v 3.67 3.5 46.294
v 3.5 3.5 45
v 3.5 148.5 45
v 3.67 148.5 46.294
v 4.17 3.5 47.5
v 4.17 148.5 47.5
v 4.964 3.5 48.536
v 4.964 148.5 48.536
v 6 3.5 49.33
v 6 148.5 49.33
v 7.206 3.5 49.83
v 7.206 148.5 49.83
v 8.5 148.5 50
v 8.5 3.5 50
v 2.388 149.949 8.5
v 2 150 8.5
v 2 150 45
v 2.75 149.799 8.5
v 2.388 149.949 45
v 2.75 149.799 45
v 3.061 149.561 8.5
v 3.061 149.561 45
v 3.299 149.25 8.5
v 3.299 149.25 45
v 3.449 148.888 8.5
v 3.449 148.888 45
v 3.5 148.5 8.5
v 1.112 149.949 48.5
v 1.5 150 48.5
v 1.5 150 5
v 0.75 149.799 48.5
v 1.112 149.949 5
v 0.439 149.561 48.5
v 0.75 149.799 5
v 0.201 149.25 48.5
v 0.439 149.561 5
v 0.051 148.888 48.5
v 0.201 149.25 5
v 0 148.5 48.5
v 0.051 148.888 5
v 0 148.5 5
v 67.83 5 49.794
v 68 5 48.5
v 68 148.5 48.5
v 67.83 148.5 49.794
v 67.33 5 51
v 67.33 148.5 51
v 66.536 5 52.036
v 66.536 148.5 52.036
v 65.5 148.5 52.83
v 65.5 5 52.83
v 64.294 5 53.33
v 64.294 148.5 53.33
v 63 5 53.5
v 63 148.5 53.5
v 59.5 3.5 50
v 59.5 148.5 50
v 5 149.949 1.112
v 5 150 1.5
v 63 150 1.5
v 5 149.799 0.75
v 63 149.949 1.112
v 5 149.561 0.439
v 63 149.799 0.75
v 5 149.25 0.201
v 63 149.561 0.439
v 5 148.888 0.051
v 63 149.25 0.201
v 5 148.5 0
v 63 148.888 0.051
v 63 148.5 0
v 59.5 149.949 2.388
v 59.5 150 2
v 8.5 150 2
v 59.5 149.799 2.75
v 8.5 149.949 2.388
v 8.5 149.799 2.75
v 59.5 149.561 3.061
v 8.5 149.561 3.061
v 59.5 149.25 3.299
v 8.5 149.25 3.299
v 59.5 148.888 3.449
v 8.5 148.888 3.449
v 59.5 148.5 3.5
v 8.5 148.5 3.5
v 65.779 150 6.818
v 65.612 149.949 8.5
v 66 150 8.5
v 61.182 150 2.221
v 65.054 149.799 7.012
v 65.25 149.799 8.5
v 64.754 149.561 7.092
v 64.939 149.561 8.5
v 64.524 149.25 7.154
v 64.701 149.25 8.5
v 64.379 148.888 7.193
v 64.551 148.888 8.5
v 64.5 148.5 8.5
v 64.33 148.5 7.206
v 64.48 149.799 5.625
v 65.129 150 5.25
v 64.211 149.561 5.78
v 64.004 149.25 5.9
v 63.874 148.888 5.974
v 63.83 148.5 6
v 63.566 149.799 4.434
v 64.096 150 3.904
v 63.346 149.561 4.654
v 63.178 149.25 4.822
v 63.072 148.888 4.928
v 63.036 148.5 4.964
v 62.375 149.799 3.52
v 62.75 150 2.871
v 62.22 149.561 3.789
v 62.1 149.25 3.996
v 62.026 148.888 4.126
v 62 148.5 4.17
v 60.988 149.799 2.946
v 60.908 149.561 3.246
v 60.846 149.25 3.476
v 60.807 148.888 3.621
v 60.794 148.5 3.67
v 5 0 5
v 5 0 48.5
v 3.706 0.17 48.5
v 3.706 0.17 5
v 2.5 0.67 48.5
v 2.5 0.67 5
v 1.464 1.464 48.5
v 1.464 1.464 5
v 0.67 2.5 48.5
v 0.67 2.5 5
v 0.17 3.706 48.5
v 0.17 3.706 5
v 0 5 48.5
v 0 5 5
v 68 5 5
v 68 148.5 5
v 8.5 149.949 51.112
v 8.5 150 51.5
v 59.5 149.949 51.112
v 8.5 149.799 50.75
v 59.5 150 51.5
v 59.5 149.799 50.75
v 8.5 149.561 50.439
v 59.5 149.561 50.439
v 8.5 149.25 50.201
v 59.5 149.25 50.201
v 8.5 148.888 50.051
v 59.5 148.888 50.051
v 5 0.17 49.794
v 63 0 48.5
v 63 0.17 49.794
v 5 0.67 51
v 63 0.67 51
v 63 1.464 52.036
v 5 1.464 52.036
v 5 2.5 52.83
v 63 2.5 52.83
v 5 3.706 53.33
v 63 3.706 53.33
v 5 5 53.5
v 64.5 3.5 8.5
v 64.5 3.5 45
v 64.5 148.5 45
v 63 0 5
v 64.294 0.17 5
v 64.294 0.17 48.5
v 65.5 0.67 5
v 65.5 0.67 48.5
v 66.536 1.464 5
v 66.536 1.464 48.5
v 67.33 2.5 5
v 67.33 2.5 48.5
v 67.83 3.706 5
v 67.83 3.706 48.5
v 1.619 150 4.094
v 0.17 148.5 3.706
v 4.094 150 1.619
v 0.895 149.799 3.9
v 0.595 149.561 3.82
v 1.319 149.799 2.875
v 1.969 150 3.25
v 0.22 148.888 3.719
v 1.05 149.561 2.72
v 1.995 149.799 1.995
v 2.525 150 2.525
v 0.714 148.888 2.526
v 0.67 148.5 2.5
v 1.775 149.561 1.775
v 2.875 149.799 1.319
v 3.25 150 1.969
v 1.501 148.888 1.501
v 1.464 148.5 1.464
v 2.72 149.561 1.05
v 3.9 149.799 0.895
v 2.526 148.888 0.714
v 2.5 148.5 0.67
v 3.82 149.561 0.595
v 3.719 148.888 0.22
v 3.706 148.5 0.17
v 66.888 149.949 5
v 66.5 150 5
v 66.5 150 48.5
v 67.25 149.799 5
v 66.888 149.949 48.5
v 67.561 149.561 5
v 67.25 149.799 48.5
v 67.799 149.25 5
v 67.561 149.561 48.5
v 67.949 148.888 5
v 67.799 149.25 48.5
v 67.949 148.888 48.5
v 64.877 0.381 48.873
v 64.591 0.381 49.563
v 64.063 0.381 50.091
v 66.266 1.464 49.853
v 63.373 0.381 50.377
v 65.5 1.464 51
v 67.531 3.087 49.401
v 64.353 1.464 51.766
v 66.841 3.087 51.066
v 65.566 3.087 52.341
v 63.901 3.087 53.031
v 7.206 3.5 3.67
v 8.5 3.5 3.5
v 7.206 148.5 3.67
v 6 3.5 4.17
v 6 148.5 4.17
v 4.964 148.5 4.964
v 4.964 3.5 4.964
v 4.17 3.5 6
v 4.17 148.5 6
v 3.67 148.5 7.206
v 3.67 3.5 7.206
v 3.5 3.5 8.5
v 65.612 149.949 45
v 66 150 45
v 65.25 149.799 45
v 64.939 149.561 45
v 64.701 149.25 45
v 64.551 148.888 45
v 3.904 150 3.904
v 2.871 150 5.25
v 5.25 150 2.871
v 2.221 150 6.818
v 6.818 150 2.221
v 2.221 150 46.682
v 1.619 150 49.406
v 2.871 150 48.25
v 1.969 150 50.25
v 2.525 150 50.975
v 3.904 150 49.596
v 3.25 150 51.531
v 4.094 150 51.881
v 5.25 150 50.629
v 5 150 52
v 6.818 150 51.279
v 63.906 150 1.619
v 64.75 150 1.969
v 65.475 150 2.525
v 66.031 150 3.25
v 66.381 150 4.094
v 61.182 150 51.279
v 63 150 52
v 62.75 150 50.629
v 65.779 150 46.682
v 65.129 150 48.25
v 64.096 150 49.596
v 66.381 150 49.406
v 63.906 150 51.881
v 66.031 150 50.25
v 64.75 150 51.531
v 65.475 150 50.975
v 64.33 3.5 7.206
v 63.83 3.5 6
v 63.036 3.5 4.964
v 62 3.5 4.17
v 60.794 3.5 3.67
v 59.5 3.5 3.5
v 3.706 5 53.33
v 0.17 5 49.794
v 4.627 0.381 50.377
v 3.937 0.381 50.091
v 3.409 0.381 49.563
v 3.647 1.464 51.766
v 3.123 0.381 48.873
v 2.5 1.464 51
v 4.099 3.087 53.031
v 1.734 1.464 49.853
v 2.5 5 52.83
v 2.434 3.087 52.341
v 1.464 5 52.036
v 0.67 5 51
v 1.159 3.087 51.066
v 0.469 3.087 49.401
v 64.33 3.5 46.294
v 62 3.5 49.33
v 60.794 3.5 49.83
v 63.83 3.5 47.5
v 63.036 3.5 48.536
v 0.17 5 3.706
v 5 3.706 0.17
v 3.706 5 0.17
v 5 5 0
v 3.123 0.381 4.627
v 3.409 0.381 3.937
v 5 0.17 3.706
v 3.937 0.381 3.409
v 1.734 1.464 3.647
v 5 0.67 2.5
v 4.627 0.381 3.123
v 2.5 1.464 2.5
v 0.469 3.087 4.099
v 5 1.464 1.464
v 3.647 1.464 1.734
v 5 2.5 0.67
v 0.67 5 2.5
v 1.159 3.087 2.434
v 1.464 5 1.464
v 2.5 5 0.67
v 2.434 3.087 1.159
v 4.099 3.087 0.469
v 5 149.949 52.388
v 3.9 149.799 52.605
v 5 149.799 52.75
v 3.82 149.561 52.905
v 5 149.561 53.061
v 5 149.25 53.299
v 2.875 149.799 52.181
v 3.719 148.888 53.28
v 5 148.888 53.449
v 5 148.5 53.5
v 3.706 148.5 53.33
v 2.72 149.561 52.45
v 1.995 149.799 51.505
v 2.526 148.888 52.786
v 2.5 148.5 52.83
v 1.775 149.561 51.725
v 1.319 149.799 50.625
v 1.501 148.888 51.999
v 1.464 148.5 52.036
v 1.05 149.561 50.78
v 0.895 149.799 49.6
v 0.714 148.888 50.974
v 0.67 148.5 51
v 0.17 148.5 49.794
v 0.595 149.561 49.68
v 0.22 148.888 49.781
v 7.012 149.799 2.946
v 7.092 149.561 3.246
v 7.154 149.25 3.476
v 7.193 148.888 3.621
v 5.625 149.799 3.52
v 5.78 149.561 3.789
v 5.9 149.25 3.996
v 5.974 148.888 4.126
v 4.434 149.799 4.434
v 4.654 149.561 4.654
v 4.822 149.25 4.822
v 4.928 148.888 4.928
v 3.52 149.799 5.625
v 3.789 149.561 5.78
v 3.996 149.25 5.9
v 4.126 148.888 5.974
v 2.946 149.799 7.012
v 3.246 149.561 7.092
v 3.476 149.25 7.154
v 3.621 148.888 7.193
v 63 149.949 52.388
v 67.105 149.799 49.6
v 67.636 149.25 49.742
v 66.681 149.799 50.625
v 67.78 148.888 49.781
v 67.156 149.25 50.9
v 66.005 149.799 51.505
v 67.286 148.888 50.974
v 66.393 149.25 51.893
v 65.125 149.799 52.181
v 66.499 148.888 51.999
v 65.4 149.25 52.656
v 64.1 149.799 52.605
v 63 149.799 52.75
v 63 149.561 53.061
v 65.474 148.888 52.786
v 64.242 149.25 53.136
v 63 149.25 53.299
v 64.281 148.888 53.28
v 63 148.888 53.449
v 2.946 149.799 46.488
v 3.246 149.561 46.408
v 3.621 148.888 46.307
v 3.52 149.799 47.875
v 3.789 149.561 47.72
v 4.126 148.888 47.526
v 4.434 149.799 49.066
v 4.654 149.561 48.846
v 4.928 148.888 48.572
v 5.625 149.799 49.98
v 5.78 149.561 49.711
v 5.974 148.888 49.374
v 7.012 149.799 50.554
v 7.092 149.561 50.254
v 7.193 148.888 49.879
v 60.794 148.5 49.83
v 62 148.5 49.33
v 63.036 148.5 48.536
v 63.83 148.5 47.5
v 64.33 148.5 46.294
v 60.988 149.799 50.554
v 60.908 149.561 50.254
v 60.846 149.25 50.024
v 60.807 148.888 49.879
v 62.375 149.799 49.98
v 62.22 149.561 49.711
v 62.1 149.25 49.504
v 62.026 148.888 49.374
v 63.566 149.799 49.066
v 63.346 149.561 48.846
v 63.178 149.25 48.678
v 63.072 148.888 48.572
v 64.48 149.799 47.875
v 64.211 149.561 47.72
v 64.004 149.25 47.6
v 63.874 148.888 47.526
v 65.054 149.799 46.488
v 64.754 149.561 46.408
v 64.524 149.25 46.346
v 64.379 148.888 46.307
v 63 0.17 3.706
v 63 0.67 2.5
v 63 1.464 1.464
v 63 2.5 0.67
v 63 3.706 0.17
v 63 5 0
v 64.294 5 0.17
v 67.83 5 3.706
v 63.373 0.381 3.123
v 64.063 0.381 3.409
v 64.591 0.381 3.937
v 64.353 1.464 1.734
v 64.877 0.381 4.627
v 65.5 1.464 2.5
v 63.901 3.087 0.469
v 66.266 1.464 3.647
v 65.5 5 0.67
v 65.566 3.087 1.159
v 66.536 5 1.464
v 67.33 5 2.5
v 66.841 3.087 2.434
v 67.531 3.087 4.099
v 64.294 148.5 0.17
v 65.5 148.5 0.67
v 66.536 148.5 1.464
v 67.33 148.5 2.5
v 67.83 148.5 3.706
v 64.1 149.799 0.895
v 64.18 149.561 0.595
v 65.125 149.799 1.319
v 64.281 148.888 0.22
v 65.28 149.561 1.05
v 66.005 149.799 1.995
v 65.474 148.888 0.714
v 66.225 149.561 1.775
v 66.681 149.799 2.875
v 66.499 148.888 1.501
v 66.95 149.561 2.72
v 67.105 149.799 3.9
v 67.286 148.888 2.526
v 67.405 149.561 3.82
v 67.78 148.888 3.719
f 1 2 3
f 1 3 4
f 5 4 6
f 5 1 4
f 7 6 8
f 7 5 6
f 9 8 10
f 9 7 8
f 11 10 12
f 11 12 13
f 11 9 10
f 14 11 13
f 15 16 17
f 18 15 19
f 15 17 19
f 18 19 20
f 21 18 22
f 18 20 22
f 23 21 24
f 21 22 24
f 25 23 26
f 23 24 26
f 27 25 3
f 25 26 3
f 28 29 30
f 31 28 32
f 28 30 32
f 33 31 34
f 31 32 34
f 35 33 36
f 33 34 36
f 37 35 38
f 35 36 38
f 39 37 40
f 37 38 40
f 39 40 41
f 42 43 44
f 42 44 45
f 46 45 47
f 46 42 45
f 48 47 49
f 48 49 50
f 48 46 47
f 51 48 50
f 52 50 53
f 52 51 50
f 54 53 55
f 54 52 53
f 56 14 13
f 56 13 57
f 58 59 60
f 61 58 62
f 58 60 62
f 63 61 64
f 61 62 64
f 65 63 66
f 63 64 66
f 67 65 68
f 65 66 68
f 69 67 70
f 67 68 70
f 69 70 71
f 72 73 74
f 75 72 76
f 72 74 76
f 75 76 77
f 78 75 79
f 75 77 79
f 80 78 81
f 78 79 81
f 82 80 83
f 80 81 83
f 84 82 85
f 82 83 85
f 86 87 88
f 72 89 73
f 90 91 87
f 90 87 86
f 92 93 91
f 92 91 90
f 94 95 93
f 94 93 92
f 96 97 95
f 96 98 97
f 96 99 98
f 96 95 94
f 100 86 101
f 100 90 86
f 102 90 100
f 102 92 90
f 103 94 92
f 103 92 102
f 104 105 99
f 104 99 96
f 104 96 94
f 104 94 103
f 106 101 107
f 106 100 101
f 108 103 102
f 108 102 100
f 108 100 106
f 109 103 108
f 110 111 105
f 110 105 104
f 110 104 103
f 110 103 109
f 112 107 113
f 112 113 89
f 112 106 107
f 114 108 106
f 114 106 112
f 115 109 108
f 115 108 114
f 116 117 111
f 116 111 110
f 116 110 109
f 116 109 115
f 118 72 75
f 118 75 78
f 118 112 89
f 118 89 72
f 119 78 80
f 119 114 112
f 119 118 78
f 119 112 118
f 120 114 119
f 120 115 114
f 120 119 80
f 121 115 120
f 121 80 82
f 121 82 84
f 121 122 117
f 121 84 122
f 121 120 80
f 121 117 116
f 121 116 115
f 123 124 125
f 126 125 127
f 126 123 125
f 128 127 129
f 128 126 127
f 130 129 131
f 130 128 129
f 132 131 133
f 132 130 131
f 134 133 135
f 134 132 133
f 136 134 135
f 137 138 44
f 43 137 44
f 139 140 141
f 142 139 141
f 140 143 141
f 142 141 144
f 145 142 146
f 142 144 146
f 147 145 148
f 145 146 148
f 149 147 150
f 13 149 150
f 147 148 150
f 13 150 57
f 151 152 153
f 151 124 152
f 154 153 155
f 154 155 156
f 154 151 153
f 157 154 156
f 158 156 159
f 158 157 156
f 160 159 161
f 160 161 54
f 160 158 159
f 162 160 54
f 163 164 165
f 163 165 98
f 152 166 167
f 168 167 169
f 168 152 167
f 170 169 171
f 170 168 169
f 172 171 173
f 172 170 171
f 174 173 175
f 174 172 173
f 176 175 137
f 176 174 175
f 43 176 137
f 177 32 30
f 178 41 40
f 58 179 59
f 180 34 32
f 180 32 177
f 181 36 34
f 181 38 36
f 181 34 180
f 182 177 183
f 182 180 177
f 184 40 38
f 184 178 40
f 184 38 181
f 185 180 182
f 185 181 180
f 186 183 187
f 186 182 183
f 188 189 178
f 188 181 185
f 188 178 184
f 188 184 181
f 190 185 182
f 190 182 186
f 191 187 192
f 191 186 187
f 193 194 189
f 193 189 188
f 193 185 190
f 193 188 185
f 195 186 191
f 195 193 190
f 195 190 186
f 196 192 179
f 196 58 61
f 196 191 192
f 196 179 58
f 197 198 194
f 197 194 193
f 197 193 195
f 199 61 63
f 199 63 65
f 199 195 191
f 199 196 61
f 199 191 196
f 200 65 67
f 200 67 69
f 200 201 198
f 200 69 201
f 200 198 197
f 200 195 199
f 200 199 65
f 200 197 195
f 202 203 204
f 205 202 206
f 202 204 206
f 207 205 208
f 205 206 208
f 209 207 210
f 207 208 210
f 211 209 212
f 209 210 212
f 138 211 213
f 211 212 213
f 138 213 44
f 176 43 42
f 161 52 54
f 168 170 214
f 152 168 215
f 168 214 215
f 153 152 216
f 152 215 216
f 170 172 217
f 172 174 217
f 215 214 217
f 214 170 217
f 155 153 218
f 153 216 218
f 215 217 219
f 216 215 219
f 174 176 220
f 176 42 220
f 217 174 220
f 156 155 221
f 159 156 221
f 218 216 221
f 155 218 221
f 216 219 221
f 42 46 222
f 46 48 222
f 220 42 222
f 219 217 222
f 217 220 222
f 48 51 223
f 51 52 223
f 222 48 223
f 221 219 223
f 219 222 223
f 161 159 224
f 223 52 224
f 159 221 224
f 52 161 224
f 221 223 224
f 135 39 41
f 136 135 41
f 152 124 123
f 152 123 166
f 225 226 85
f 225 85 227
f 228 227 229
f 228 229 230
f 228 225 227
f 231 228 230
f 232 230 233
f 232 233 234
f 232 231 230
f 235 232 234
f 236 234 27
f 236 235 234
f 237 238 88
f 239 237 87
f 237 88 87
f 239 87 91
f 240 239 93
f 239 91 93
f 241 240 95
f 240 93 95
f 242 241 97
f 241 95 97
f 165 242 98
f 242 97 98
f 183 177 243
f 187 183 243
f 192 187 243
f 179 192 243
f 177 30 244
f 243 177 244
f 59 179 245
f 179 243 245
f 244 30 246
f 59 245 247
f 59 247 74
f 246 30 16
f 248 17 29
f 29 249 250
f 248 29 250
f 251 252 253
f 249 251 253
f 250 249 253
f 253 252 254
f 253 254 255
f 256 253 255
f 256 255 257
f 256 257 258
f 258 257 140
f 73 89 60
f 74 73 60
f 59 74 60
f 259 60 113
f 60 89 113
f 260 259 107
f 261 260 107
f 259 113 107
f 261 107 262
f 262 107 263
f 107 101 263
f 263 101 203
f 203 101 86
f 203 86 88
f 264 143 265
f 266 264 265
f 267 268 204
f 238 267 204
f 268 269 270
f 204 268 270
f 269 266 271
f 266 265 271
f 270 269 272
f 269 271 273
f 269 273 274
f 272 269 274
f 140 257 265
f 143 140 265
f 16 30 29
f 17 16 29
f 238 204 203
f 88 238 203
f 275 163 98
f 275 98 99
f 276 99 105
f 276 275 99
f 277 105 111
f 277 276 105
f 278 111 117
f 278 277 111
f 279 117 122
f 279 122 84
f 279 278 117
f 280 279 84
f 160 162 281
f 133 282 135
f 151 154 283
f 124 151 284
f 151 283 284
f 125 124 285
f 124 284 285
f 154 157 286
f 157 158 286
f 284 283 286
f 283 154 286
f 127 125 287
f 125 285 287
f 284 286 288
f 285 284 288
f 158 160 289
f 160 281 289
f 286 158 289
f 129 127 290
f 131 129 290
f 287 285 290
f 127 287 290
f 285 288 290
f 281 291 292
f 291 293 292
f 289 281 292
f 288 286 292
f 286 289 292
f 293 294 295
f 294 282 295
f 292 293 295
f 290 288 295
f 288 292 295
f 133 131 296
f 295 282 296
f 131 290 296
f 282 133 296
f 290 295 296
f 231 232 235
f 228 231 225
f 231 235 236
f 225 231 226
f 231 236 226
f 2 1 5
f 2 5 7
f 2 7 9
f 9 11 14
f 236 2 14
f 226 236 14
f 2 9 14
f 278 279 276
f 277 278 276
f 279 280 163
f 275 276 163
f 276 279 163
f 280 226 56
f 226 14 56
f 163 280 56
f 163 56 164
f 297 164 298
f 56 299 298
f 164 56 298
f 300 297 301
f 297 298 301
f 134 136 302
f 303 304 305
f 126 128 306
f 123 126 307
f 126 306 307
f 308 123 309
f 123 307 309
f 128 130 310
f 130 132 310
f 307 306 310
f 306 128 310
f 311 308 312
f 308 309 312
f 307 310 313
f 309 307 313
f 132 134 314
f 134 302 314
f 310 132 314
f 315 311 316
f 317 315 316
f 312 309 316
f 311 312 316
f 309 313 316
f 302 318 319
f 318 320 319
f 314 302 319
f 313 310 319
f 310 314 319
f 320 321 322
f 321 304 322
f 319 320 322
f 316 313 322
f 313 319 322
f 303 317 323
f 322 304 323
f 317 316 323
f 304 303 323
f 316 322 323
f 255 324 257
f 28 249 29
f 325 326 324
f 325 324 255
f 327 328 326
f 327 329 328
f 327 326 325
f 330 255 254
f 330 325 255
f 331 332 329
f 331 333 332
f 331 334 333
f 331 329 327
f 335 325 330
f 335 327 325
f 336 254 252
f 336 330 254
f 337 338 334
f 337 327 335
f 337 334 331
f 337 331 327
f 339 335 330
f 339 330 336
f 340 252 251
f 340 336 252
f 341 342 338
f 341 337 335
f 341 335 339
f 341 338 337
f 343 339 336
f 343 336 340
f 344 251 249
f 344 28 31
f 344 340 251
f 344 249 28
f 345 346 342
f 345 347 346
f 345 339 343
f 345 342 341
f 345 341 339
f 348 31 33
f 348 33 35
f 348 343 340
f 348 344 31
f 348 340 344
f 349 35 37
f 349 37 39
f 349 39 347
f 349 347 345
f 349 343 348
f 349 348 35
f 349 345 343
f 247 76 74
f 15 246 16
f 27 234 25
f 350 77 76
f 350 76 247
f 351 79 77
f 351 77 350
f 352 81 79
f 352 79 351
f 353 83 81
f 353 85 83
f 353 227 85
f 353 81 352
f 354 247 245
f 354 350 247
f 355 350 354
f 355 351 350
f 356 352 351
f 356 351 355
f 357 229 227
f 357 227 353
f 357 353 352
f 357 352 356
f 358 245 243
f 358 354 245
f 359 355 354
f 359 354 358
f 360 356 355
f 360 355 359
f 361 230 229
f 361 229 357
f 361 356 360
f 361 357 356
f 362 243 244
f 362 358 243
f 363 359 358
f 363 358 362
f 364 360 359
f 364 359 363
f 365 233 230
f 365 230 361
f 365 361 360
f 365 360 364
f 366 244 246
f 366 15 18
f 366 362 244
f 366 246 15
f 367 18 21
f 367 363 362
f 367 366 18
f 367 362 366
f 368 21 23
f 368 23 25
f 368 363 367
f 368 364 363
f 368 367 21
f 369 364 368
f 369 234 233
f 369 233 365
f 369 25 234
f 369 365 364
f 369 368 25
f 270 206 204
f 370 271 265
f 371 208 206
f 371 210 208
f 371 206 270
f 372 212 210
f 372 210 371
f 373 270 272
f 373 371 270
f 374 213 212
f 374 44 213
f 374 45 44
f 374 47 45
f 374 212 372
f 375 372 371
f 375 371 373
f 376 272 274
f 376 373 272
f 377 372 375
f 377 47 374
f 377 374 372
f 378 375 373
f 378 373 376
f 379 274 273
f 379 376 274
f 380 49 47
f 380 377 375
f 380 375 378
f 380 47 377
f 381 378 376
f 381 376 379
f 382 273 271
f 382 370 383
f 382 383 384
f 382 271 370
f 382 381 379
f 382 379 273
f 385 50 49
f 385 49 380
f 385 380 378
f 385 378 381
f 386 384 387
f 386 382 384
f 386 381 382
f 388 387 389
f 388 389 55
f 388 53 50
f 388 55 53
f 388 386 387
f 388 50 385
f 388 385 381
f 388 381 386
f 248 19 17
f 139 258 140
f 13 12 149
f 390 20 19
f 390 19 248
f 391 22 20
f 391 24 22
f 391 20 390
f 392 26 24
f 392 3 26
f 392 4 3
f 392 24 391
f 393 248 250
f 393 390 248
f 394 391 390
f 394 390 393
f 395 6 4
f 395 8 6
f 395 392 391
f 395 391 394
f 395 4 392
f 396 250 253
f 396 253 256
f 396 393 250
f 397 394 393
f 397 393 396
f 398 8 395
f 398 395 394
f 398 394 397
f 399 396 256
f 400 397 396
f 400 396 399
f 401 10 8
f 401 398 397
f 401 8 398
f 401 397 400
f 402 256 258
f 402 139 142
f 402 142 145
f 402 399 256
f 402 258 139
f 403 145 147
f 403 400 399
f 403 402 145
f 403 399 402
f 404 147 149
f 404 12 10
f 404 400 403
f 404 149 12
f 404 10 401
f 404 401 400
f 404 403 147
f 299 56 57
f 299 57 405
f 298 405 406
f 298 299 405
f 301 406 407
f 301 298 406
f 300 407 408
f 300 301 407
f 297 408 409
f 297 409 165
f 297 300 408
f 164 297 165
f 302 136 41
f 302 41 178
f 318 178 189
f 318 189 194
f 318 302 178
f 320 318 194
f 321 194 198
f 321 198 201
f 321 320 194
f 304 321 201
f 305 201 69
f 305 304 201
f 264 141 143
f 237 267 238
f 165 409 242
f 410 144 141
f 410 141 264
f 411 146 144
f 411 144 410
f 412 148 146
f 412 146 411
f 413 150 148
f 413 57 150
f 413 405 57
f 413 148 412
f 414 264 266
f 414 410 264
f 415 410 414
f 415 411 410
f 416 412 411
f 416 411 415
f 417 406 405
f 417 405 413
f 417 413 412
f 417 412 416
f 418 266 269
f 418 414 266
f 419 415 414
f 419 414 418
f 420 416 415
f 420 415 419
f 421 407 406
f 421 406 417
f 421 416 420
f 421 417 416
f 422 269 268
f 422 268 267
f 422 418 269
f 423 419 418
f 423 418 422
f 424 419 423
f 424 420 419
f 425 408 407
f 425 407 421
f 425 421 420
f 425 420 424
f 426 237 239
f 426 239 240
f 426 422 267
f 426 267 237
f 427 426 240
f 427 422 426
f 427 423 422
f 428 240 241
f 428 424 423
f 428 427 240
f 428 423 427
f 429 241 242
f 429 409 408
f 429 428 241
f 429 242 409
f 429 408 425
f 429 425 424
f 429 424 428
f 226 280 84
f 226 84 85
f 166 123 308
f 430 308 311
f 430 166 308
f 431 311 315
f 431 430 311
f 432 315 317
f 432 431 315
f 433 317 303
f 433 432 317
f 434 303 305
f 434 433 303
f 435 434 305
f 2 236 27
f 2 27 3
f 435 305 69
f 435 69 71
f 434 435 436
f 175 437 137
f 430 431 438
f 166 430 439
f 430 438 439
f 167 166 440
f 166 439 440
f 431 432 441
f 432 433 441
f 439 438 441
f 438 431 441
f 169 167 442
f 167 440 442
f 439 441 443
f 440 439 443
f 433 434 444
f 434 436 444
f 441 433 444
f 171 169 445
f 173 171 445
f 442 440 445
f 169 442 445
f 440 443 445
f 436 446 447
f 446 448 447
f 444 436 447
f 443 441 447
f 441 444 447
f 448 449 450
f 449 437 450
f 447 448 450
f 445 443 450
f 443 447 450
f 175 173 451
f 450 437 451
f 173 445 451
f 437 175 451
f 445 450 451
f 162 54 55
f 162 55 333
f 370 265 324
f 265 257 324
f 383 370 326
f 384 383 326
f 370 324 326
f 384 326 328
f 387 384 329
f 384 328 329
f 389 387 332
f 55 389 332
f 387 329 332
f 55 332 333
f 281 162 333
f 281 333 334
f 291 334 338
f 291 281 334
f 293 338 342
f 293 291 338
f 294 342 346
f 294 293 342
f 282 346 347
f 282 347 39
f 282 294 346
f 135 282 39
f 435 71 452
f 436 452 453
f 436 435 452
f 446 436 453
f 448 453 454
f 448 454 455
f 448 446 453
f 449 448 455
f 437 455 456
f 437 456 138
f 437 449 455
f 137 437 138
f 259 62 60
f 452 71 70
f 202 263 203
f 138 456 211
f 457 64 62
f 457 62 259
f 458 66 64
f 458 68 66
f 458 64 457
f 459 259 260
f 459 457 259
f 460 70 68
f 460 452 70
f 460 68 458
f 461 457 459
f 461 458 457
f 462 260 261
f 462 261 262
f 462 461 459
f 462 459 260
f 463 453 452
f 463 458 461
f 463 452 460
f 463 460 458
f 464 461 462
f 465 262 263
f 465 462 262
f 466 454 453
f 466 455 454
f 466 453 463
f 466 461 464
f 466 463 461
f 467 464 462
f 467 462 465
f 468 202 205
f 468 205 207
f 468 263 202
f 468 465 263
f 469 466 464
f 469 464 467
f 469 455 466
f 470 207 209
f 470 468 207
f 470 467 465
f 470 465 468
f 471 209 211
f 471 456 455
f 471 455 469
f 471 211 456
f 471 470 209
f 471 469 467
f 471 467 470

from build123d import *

# Parameters (mm, degrees)
F1_DEPTH = 3.5
F2_DEPTH = 150
F3_R     = 5
F4_R     = 1.5


with BuildPart() as f1:
    # F0 (on Front) → F1 (new body)
    with BuildSketch(Plane.XZ):
        with BuildLine():
            ThreePointArc((3.5, 8.5), (4.9644660941, 4.9644660941), (8.5, 3.5))
            Line((8.5, 3.5), (59.5, 3.5))
            ThreePointArc((59.5, 3.5), (63.0355339059, 4.9644660941), (64.5, 8.5))
            Line((64.5, 8.5), (64.5, 45))
            ThreePointArc((64.5, 45), (63.0355339059, 48.5355339059), (59.5, 50))
            Line((59.5, 50), (8.5, 50))
            ThreePointArc((8.5, 50), (4.9644660941, 48.5355339059), (3.5, 45))
            Line((3.5, 45), (3.5, 8.5))
        make_face()
    extrude(amount=-F1_DEPTH)

    # F0 (on Front) → F2 (join)
    with BuildSketch(Plane.XZ):
        with BuildLine():
            ThreePointArc((0, 5), (1.4644660941, 1.4644660941), (5, 0))
            Line((5, 0), (63, 0))
            ThreePointArc((63, 0), (66.5355339059, 1.4644660941), (68, 5))
            Line((68, 5), (68, 48.5))
            ThreePointArc((68, 48.5), (66.5355339059, 52.0355339059), (63, 53.5))
            Line((63, 53.5), (5, 53.5))
            ThreePointArc((5, 53.5), (1.4644660941, 52.0355339059), (0, 48.5))
            Line((0, 48.5), (0, 5))
        make_face()
        with BuildLine():
            Line((59.5, 3.5), (8.5, 3.5))
            ThreePointArc((8.5, 3.5), (4.9644660941, 4.9644660941), (3.5, 8.5))
            Line((3.5, 8.5), (3.5, 45))
            ThreePointArc((3.5, 45), (4.9644660941, 48.5355339059), (8.5, 50))
            Line((8.5, 50), (59.5, 50))
            ThreePointArc((59.5, 50), (63.0355339059, 48.5355339059), (64.5, 45))
            Line((64.5, 45), (64.5, 8.5))
            ThreePointArc((64.5, 8.5), (63.0355339059, 4.9644660941), (59.5, 3.5))
        make_face(mode=Mode.SUBTRACT)
    extrude(amount=-F2_DEPTH)

    # F3
    f3_edges = [f1.edges().sort_by_distance(p)[0] for p in [
        (34, 0, 53.5),
        (1.464466, 0, 52.035534),
        (0, 0, 26.75),
        (1.464466, 0, 1.464466),
        (34, 0, 0),
        (66.535534, 0, 1.464466),
        (68, 0, 26.75),
        (66.535534, 0, 52.035534),
    ]]
    fillet(f3_edges, radius=F3_R)

    # F4
    f4_edges = [f1.edges().sort_by_distance(p)[0] for p in [
        (34, 150, 53.5),
        (34, 150, 50),
        (1.464466, 150, 52.035534),
        (4.964466, 150, 48.535534),
        (0, 150, 26.75),
        (3.5, 150, 26.75),
        (1.464466, 150, 1.464466),
        (4.964466, 150, 4.964466),
        (34, 150, 3.5),
        (34, 150, 0),
        (66.535534, 150, 1.464466),
        (63.035534, 150, 4.964466),
        (68, 150, 26.75),
        (64.5, 150, 26.75),
        (63.035534, 150, 48.535534),
        (66.535534, 150, 52.035534),
    ]]
    fillet(f4_edges, radius=F4_R)


solid = f1.part
